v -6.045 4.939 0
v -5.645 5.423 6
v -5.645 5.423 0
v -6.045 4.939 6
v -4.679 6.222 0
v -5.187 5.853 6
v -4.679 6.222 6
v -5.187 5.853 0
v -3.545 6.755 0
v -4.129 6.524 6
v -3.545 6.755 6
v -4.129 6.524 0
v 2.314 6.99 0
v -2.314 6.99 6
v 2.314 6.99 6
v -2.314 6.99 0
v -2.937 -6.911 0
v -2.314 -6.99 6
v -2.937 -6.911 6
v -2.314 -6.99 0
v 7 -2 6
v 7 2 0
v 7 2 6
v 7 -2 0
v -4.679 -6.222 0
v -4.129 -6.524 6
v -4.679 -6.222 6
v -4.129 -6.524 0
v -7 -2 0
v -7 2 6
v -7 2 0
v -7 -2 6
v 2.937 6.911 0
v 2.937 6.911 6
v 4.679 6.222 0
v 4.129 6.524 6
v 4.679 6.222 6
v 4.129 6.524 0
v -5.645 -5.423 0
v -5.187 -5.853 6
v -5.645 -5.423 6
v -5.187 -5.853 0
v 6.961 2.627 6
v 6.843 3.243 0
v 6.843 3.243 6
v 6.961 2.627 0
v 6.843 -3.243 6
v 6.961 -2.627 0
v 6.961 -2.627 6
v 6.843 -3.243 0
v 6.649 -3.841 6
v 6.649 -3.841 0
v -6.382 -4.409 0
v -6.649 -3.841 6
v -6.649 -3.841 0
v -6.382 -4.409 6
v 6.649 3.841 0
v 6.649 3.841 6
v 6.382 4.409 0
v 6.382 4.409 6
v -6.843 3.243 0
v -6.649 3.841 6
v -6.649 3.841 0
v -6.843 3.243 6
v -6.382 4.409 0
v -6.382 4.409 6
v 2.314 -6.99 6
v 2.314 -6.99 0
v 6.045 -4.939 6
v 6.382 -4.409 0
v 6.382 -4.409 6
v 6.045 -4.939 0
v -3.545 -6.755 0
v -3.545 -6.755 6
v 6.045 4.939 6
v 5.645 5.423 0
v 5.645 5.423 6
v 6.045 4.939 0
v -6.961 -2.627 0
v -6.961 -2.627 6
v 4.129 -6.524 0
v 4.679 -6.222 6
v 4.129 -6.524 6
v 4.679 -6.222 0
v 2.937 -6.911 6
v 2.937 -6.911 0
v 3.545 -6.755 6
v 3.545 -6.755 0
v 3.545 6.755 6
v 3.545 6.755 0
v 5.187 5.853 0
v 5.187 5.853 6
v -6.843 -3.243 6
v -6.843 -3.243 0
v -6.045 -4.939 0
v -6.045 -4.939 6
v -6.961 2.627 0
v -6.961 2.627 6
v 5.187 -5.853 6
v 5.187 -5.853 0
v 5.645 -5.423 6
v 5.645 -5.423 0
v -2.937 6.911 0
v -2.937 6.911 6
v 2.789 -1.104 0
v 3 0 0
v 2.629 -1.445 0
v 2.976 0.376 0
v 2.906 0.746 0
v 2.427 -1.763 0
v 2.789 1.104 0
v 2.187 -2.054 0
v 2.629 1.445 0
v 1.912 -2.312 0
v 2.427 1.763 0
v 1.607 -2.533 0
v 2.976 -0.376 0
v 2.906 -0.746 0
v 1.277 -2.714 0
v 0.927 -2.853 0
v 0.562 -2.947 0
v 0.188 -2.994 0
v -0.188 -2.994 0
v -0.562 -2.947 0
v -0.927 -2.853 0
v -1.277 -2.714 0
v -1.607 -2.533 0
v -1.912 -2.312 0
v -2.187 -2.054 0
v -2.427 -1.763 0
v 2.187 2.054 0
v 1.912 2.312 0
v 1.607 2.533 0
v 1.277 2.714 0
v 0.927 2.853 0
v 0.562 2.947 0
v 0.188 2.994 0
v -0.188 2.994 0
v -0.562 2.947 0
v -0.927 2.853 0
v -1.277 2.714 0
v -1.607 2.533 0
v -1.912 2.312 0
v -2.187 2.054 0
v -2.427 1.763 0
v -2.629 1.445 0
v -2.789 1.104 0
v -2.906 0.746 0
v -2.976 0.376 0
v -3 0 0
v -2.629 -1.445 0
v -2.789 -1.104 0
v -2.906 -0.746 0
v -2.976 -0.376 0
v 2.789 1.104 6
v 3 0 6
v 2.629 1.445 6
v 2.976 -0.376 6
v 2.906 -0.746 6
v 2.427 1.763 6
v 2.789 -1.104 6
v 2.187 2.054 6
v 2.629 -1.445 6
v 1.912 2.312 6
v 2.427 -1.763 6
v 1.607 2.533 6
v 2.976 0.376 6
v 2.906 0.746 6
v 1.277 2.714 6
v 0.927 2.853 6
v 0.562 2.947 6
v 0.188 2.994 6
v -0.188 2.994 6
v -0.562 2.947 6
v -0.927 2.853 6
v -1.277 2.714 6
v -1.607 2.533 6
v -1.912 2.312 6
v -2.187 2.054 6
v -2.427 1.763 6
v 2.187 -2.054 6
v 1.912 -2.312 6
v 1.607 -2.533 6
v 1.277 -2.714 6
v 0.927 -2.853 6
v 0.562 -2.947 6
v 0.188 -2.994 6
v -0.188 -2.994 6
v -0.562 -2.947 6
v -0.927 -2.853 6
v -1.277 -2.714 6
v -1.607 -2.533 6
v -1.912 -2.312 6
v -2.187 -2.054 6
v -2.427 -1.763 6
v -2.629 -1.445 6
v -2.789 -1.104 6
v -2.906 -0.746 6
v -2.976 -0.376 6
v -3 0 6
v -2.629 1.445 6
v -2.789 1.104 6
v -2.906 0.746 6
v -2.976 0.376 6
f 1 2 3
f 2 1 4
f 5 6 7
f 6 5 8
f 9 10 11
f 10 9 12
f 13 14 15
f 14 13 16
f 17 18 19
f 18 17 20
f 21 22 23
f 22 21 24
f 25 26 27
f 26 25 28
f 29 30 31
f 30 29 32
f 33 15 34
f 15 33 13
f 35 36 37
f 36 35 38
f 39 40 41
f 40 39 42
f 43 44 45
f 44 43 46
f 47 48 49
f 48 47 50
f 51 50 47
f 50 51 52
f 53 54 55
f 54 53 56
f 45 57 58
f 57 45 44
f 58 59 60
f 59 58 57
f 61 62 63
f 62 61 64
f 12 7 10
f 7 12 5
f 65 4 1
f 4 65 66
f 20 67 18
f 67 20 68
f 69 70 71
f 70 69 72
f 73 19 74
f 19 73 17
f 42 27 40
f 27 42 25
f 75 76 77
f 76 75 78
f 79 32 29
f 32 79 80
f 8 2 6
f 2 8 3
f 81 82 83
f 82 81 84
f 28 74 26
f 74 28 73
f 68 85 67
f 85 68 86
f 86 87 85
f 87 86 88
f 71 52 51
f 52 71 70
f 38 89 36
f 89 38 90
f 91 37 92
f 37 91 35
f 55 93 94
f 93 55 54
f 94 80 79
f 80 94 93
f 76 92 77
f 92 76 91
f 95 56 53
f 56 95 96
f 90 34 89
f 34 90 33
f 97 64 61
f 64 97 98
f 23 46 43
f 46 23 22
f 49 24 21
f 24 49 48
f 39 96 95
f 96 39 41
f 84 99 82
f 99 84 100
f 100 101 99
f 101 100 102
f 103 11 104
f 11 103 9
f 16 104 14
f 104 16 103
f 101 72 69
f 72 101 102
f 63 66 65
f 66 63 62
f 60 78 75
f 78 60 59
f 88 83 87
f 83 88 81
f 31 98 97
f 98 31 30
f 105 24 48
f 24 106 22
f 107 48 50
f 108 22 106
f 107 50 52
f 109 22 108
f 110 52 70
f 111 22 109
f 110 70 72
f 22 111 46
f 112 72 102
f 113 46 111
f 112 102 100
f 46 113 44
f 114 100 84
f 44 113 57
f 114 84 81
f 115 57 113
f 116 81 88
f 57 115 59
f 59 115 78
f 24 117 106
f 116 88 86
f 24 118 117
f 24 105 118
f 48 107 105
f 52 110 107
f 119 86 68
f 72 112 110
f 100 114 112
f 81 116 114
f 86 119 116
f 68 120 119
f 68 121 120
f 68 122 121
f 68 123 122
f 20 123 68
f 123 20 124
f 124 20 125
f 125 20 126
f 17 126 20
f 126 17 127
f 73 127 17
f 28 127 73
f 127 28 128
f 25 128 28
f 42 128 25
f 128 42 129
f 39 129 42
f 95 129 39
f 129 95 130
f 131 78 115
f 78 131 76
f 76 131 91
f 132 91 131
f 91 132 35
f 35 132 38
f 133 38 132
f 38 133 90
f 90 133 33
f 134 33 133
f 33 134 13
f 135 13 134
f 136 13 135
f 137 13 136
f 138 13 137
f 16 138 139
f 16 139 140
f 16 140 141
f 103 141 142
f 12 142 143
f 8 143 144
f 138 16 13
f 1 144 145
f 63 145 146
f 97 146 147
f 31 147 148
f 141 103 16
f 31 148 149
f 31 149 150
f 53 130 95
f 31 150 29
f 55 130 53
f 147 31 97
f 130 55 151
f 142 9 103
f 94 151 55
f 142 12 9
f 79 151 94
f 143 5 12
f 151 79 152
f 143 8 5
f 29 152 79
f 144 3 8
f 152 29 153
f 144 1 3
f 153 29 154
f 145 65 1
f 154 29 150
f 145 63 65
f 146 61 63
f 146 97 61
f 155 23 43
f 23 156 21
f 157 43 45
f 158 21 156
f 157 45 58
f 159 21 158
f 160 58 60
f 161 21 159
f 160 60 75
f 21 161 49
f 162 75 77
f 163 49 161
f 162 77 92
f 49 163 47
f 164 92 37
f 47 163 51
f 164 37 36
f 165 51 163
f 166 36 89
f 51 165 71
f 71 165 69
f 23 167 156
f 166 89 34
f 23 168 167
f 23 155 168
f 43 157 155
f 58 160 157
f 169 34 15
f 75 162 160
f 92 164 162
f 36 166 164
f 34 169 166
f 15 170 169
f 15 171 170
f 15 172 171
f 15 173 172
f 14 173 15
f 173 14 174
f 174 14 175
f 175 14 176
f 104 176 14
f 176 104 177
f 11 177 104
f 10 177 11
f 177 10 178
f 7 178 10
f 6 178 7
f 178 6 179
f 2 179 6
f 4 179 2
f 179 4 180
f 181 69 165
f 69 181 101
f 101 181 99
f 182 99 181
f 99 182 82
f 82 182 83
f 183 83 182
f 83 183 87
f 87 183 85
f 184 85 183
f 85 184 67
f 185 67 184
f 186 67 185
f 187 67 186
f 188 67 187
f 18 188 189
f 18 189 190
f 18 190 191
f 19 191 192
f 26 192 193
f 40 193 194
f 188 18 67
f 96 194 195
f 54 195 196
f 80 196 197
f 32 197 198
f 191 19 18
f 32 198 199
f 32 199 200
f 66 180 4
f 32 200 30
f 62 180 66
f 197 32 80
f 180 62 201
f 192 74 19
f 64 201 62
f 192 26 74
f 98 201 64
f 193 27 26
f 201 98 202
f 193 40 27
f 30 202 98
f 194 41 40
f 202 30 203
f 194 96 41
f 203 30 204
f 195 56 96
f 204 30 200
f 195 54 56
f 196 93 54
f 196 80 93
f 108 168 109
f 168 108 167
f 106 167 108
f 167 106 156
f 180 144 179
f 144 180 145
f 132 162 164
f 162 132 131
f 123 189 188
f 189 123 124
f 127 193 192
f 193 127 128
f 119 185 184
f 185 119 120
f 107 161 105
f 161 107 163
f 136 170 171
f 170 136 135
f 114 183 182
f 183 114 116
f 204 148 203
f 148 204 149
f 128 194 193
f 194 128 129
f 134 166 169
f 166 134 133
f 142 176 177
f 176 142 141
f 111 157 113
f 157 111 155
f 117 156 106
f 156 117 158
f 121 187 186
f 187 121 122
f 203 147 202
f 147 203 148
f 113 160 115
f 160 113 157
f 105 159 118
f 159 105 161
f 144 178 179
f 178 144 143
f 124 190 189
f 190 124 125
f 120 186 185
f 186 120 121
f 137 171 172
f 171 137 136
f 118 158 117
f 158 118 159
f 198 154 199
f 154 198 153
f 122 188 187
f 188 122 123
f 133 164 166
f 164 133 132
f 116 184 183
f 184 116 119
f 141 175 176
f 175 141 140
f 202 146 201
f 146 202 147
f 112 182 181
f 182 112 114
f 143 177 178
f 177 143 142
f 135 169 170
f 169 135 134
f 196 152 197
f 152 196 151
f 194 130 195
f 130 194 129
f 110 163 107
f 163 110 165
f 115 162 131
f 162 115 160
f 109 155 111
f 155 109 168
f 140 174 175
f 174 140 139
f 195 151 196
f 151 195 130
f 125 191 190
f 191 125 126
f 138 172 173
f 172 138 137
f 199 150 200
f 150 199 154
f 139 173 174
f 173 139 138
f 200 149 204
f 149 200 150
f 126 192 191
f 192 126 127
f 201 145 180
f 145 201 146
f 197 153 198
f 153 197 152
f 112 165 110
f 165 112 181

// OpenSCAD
// Generated by SolidPython 1.1.3 on 2023-03-12 22:43:42
$fn = 50;


difference() {
	union() {
		translate(v = [0, 0, 0]) {
			rotate(a = [0, 0, 0]) {
				hull() {
					translate(v = [-2.0000000000, 2.0000000000, 0]) {
						rotate(a = [0, 0, 0]) {
							translate(v = [0, 0, 0]) {
								rotate(a = [0, 0, 0]) {
									cylinder(h = 6, r = 5);
								}
							}
						}
					}
					translate(v = [2.0000000000, 2.0000000000, 0]) {
						rotate(a = [0, 0, 0]) {
							translate(v = [0, 0, 0]) {
								rotate(a = [0, 0, 0]) {
									cylinder(h = 6, r = 5);
								}
							}
						}
					}
					translate(v = [-2.0000000000, -2.0000000000, 0]) {
						rotate(a = [0, 0, 0]) {
							translate(v = [0, 0, 0]) {
								rotate(a = [0, 0, 0]) {
									cylinder(h = 6, r = 5);
								}
							}
						}
					}
					translate(v = [2.0000000000, -2.0000000000, 0]) {
						rotate(a = [0, 0, 0]) {
							translate(v = [0, 0, 0]) {
								rotate(a = [0, 0, 0]) {
									cylinder(h = 6, r = 5);
								}
							}
						}
					}
				}
			}
		}
	}
	union() {
		translate(v = [0.0000000000, 0.0000000000, 0]) {
			rotate(a = [0, 0, 0]) {
				translate(v = [0, 0, -50]) {
					rotate(a = [0, 0, 0]) {
						cylinder(h = 100, r = 3.0000000000);
					}
				}
			}
		}
	}
}
/***********************************************
*********      SolidPython code:      **********
************************************************
 
from solid import *
import os
import subprocess

import oomB

import opsc_library_gen

mode = "laser"
#mode = "3d_print"

defined_objects = {}

radius_dict = {}
countersunk_dict = {}


def set_mode(m):
    global mode
    mode = m
    radius_dict['M6'] = 6.5/2
    radius_dict['M3'] = 3.3/2
    if mode == "laser":
        radius_dict['M6'] = 6/2
        radius_dict['M3'] = 3/2

    countersunk_dict['M3'] = {}
    countersunk_dict['M3']['little_rad'] = radius_dict['M3']
    countersunk_dict['M3']['big_rad'] = (5.5+0.6)/2
    if mode == "laser":
        countersunk_dict['M3']['big_rad'] = (4.75+0.6)/2
        countersunk_dict['M3']['little_rad'] = (4.75+0.6)/2

    countersunk_dict['M3']['height'] = 1.7


def opsc_make_object(filename, objects, save_type="none",resolution=50, layers = 1, tilediff = 200, mode="laser", overwrite=True):
    if overwrite or not os.path.exists(filename):
        set_mode(mode)
        save_type = save_type.lower()
        os.makedirs(os.path.dirname(filename), exist_ok=True)
        final_object = opsc_get_object(objects, mode = mode)
        # Save the final object to the specified filename    
        scad_render_to_file(final_object, filename, file_header='$fn = %s;' % resolution, include_orig_code=True)
        if mode == "laser":
            filename_laser = filename.replace(".scad","-flat.scad")
            scad_render_to_file(getLaser(final_object, layers=layers, tilediff=tilediff), filename_laser, file_header='$fn = %s;' % resolution, include_orig_code=True)
            if save_type == "all":
                saveToAll(filename_laser)
            elif save_type == "dxf":
                saveToDxf(filename_laser)
        if save_type == "all":
            saveToAll(filename)
        elif save_type == "dxf":
            saveToDxf(filename)


def opsc_get_object(objects, mode = "laser"):
    # Create the solidpython objects only include the positive objects and if they don't have inclusion or their inclusion is either all or mode
    # Initialize an empty list to store the results
    positive_objects = []

    # Iterate over the "objects" list
    for obj in objects:
        # Check if the current object has a "type" key with a value of "positive"
        if obj['type'] == 'positive':
            # Check if the current object has an "inclusion" key and its value matches "mode",
            # or if the current object does not have an "inclusion" key at all
            if not 'inclusion' in obj or obj['inclusion'] == "all" or obj['inclusion'] == mode:
                # Call the "get_opsc_item" function with the current object as an argument
                opsc_item = get_opsc_item(obj)
                # Add the result to the "positive_objects" list
                positive_objects.append(opsc_item)
# Initialize an empty list to store the results
    negative_objects = []

    # Iterate over the "objects" list
    for obj in objects:
        # Check if the current object has a "type" key with a value of "negative"
        if obj['type'] == 'negative':
            # Check if the current object has an "inclusion" key and its value matches "mode",
            # or if the current object does not have an "inclusion" key at all
            if not 'inclusion' in obj or obj['inclusion'] == "all" or obj['inclusion'] == mode:
                # Call the "get_opsc_item" function with the current object as an argument
                opsc_item = get_opsc_item(obj)
                # Add the result to the "negative_objects" list
                negative_objects.append(opsc_item)
    
    #positive_objects = [get_opsc_item(obj) for obj in objects if obj['type'] == 'positive']
    #negative_objects = [get_opsc_item(obj) for obj in objects if obj['type'] == 'negative']
    # Union the positive objects
    positive_object = union()(*positive_objects)
    # Union the negative objects
    negative_object = union()(*negative_objects)
    # Create the final object by subtracting the negative objects from the positive objects
    return difference()(positive_object, negative_object)

def get_opsc_item(params):
    # A dictionary to map radius string values to numerical values
    #radius_dict = {'small': 5, 'medium': 10, 'large': 15}
    # An array of function names for basic shapes
    basic_shapes = ['cube', 'sphere', 'cylinder']
    
    # An array of function names for other shapes
    other_shapes = ['hole', 'slot', 'rounded_rectangle', 'countersunk']
    


    # Convert radius to r if present, and remove radius from the params dictionary
    if 'radius' in params:
        if isinstance(params['radius'], str):
            # Use the radius_dict to map the radius string value to a numerical value
            params['r'] = radius_dict[params['radius']]
        else:
            params['r'] = params['radius']
        del params['radius']
    

    # Check if the object type is a basic shape
    if params['shape'] in basic_shapes:
        # Remove shape and unexpected dictionary values
        allowed_keys = {'size', 'r', 'r1', 'r2', 'd', 'h', 'rw', 'rh', 'dw', 'dh'}
        shape_params = {k: v for k, v in params.items() if k in allowed_keys}

        # Call the corresponding function for the shape parameter, using ** notation to pass the shape_params dictionary as keyword arguments
        return get_opsc_transform(params,globals()[params['shape']](**shape_params))
    
    # If the object type is not a basic shape, check if it's a defined object or one of the other shapes
    elif params['shape'] in other_shapes:
        # Call the corresponding function for the shape parameter, passing the params dictionary as an argument
        p2 = copy.deepcopy(params)
        p2["pos"] = [0,0,0]
        return get_opsc_transform(params,globals()[params['shape']](p2))
    
    # If the object is not a basic shape or a defined object, try to import it from a .scad file
    else:
        obj = defined_objects[params['shape']]
        return get_opsc_transform(params,obj)

def get_opsc_transform(params, solid_obj):
    # Rotate the object based on the 'rot' field in the params dictionary, or the 'rotX', 'rotY', and 'rotZ' fields if 'rot' is not present
    rot = params.get('rot', [])
    if rot:
        rotX, rotY, rotZ = rot
    else:
        rotX = params.get('rotX', 0)
        rotY = params.get('rotY', 0)
        rotZ = params.get('rotZ', 0)
    solid_obj = rotate([rotX, rotY, rotZ])(solid_obj)

    # Translate the object based on the 'pos' field in the params dictionary, or the 'x', 'y', and 'z' fields if 'pos' is not present
    pos = params.get('pos', [])
    if pos:
        x, y, z = pos
    else:
        x = params.get('x', 0)
        y = params.get('y', 0)
        z = params.get('z', 0)
    solid_obj = translate([x, y, z])(solid_obj)
    return solid_obj


import random

def opsc_easy_array(type, shape, repeats, pos_start, shift_arr, **kwargs):
    for i in range(0,3):
        repeats.append(1)
        pos_start.append(0)
        shift_arr.append(0)
    return_objects = []

    for x in range(0,repeats[0]):
        for y in range(0,repeats[1]):
            for z in range(0,repeats[2]):
                return_objects.append(opsc_easy(type, shape, pos=[pos_start[0]+x*shift_arr[0],pos_start[1]+y*shift_arr[1],pos_start[2]+z*shift_arr[2]], **kwargs))
    return return_objects                



def opsc_easy(type, shape, **kwargs):
    obj = {
        'type': type,
        'shape': shape
    }
    for param in ['size', 'r', 'r1', 'r2', 'd', 'h', 'rw', 'rh', 'dw', 'dh', 'pos', 'x', 'y', 'z', 'rot', 'rotX', 'rotY', 'rotZ', "w", "inclusion"]:
        if param in kwargs:
            obj[param] = kwargs[param]
    return obj

def hole(params):
    p2 = copy.deepcopy(params)  
    # Check if the radius is a string and replace it with the corresponding value from the dictionary
    if isinstance(p2['r'], str):
        p2['r'] = radius_dict[p2['r']]
    
    # Set the height to 100 if not specified
    if 'h' not in p2:
        p2['h'] = 100
        p2["pos"] = [0,0,-50]
    p2["center"] = True
    # Create the cylinder object
    p2["shape"] = "cylinder"
    p2["type"] = "positive"

    return get_opsc_item(p2)

import copy

def countersunk(params):
    p2 = copy.deepcopy(params)
    counter_rad = p2['r']
    p2['r'] = radius_dict[p2['r']]
    hp = copy.deepcopy(p2)
    hp["type"] = "positive"
    hp["shape"] = "hole"
    del hp["rot"]
    hol = get_opsc_item(hp)
    
    cp = copy.deepcopy(p2)
    cp["h"] = countersunk_dict[counter_rad]["height"]
    cp["r2"] = countersunk_dict[counter_rad]["little_rad"]
    cp["r1"] = countersunk_dict[counter_rad]["big_rad"]
    del cp["r"]
    del cp["rot"]
    cp["type"] = "positive"
    cp["shape"] = "cylinder"
    cp["pos"] = [0,0,0]

    top = get_opsc_item(cp)
    return union()(hol,top)



def slot(params):  
    p2 = copy.deepcopy(params) 
    if isinstance(p2['r'], str):
        p2['r'] = radius_dict[p2['r']]
    p2["type"] = "positive"
    p2["shape"] = "hole"
    del p2["rot"]
    p2["pos"] = [0,0,0]
    left = copy.deepcopy(p2)
    right = copy.deepcopy(p2)
    left["pos"][0] = p2["w"] / 2 - p2["r"] 
    
    right["pos"][0] = -p2["w"] / 2 + p2["r"] 
    pass
    leftObj = get_opsc_item(left)
    rightObj = get_opsc_item(right)
    return hull()(leftObj, rightObj)

def rounded_rectangle(params):   
    p2 = copy.deepcopy(params) 
    p2["h"] = p2["size"][2]
    p2["pos"] = p2.get("pos", [0, 0, 0]) 
    p2["type"] = "positive"
    p2["shape"] = "hole"
    p2["pos"] = [0,0,0]
    
    if 'rot' in p2:
        del p2["rot"]   
    if 'r' not in p2:
        p2["r"] = 5 
    tl = copy.deepcopy(p2)
    tr = copy.deepcopy(p2)
    bl = copy.deepcopy(p2)
    br = copy.deepcopy(p2)
    tl["pos"][0] = -(p2["size"][0] - p2["r"]*2)/2
    tl["pos"][1] = (p2["size"][1] - p2["r"]*2)/2
    tr["pos"][0] = (p2["size"][0] - p2["r"]*2)/2
    tr["pos"][1] = (p2["size"][1] - p2["r"]*2)/2
    bl["pos"][0] = -(p2["size"][0] - p2["r"]*2)/2
    bl["pos"][1] = -(p2["size"][1] - p2["r"]*2)/2
    br["pos"][0] = (p2["size"][0] - p2["r"]*2)/2
    br["pos"][1] = -(p2["size"][1] - p2["r"]*2)/2
    del tl["size"]
    del tr["size"]
    del bl["size"]
    del br["size"]
    tlo = get_opsc_item(tl)
    tro = get_opsc_item(tr)
    blo = get_opsc_item(bl)
    bro = get_opsc_item(br)    
    return hull()(tlo, tro, blo, bro)



def import_scad_object(filename):
    # Import the .scad file and convert it to a solidpython object
    #filename = "parts"
    obj = import_scad(filename)
    return obj.main()
    


import os
import solid as solidpython

# A dictionary to store the defined objects


def load_scad_objects():
    opsc_library_gen.gen_library(defined_objects)

import random

def test(num_objects):
    objects = []
    for i in range(num_objects):
        # Choose a random shape
        #shape = random.choice(['cube', 'sphere', 'cylinder', 'hole', 'slot', "rounded_rectangle"])
        shape = random.choice(["rounded_rectangle"])

        # Choose a random type
        type = random.choice(['positive', 'negative'])
        
        # Create an empty object dictionary
        obj = {'shape': shape, 'type': type}
        
        # Set shape-specific parameters
        if obj['shape'] in ['cube']:
            obj['size'] =  [random.uniform(5, 15), random.uniform(5, 15), random.uniform(5, 15)]
        if obj['shape'] in ['rounded_rectangle']:
            obj['size'] =  [random.uniform(5, 15), random.uniform(5, 15), random.uniform(5, 15)]
            obj['r'] = random.uniform(0.5, 5)
        elif obj['shape'] == 'sphere':
            obj['r'] = random.uniform(5, 15)
        elif obj['shape'] in ['cylinder', 'hole']:
            obj['r'] = random.uniform(0.5, 5)
            obj['h'] = random.uniform(5, 15)
        elif obj['shape'] == 'slot':
            obj['r'] = random.uniform(0.5, 5)
            obj['h'] = random.uniform(5, 15)
            obj['w'] = random.uniform(5, 15)
        
        # Set a random position and rotation
        obj['pos'] = [random.uniform(-20, 20), random.uniform(-20, 20), random.uniform(-20, 20)]
        obj['rot'] = [random.uniform(-180, 180), random.uniform(-180, 180), random.uniform(-180, 180)]
        
        # Add the object to the list
        objects.append(obj)
    return objects

####### old file saving
def saveToAll(fileIn):
    saveToDxf(fileIn)
    saveToPng(fileIn)
    saveToStl(fileIn)
    saveToSvg(fileIn)

def saveToDxf(fileIn, fileOut="", copy_to_laser=True):
    if fileOut == "":
        fileOut = fileIn.replace(".scad",".dxf")
    saveToFile(fileIn, fileOut)


    
def saveToPng(fileIn, fileOut="",extra="--render"):
    if fileOut == "":
        fileOut = fileIn.replace(".scad",".png")
    saveToFile(fileIn, fileOut)

def saveToStl(fileIn, fileOut=""):
    if fileOut == "":
        fileOut = fileIn.replace(".scad",".stl")
    saveToFile(fileIn, fileOut)
    
def saveToSvg(fileIn, fileOut=""):
    if fileOut == "":
        fileOut = fileIn.replace(".scad",".svg")
    saveToFile(fileIn, fileOut)

def saveToFile(fileIn, fileOut,extra=""):
    #extra = extra + " --colorscheme Tomorrow"

    launchStr = 'openscad -o "' + fileOut + '"' + extra + ' "' + fileIn + '"'
    if ".png" in fileOut:
        launchStr = launchStr + " --render"
    print("            saveToFile launch string: " + launchStr)
    subprocess.run(launchStr)
    x=0

def getLaser(final_object,start=1.5,layers=1,thickness=3,tilediff=200):
        rv= []

        for x in range(layers):
            rv.append(translate([0,x*tilediff,0])(
                    projection()(
                        intersection()(translate([-500,-500,start+x*thickness])(cube(size=[1000,1000,0.1])),
                            final_object
                        )
                    )
            )
            )
            
        return union()(rv)

set_mode("laser")
load_scad_objects() 
 
************************************************/
